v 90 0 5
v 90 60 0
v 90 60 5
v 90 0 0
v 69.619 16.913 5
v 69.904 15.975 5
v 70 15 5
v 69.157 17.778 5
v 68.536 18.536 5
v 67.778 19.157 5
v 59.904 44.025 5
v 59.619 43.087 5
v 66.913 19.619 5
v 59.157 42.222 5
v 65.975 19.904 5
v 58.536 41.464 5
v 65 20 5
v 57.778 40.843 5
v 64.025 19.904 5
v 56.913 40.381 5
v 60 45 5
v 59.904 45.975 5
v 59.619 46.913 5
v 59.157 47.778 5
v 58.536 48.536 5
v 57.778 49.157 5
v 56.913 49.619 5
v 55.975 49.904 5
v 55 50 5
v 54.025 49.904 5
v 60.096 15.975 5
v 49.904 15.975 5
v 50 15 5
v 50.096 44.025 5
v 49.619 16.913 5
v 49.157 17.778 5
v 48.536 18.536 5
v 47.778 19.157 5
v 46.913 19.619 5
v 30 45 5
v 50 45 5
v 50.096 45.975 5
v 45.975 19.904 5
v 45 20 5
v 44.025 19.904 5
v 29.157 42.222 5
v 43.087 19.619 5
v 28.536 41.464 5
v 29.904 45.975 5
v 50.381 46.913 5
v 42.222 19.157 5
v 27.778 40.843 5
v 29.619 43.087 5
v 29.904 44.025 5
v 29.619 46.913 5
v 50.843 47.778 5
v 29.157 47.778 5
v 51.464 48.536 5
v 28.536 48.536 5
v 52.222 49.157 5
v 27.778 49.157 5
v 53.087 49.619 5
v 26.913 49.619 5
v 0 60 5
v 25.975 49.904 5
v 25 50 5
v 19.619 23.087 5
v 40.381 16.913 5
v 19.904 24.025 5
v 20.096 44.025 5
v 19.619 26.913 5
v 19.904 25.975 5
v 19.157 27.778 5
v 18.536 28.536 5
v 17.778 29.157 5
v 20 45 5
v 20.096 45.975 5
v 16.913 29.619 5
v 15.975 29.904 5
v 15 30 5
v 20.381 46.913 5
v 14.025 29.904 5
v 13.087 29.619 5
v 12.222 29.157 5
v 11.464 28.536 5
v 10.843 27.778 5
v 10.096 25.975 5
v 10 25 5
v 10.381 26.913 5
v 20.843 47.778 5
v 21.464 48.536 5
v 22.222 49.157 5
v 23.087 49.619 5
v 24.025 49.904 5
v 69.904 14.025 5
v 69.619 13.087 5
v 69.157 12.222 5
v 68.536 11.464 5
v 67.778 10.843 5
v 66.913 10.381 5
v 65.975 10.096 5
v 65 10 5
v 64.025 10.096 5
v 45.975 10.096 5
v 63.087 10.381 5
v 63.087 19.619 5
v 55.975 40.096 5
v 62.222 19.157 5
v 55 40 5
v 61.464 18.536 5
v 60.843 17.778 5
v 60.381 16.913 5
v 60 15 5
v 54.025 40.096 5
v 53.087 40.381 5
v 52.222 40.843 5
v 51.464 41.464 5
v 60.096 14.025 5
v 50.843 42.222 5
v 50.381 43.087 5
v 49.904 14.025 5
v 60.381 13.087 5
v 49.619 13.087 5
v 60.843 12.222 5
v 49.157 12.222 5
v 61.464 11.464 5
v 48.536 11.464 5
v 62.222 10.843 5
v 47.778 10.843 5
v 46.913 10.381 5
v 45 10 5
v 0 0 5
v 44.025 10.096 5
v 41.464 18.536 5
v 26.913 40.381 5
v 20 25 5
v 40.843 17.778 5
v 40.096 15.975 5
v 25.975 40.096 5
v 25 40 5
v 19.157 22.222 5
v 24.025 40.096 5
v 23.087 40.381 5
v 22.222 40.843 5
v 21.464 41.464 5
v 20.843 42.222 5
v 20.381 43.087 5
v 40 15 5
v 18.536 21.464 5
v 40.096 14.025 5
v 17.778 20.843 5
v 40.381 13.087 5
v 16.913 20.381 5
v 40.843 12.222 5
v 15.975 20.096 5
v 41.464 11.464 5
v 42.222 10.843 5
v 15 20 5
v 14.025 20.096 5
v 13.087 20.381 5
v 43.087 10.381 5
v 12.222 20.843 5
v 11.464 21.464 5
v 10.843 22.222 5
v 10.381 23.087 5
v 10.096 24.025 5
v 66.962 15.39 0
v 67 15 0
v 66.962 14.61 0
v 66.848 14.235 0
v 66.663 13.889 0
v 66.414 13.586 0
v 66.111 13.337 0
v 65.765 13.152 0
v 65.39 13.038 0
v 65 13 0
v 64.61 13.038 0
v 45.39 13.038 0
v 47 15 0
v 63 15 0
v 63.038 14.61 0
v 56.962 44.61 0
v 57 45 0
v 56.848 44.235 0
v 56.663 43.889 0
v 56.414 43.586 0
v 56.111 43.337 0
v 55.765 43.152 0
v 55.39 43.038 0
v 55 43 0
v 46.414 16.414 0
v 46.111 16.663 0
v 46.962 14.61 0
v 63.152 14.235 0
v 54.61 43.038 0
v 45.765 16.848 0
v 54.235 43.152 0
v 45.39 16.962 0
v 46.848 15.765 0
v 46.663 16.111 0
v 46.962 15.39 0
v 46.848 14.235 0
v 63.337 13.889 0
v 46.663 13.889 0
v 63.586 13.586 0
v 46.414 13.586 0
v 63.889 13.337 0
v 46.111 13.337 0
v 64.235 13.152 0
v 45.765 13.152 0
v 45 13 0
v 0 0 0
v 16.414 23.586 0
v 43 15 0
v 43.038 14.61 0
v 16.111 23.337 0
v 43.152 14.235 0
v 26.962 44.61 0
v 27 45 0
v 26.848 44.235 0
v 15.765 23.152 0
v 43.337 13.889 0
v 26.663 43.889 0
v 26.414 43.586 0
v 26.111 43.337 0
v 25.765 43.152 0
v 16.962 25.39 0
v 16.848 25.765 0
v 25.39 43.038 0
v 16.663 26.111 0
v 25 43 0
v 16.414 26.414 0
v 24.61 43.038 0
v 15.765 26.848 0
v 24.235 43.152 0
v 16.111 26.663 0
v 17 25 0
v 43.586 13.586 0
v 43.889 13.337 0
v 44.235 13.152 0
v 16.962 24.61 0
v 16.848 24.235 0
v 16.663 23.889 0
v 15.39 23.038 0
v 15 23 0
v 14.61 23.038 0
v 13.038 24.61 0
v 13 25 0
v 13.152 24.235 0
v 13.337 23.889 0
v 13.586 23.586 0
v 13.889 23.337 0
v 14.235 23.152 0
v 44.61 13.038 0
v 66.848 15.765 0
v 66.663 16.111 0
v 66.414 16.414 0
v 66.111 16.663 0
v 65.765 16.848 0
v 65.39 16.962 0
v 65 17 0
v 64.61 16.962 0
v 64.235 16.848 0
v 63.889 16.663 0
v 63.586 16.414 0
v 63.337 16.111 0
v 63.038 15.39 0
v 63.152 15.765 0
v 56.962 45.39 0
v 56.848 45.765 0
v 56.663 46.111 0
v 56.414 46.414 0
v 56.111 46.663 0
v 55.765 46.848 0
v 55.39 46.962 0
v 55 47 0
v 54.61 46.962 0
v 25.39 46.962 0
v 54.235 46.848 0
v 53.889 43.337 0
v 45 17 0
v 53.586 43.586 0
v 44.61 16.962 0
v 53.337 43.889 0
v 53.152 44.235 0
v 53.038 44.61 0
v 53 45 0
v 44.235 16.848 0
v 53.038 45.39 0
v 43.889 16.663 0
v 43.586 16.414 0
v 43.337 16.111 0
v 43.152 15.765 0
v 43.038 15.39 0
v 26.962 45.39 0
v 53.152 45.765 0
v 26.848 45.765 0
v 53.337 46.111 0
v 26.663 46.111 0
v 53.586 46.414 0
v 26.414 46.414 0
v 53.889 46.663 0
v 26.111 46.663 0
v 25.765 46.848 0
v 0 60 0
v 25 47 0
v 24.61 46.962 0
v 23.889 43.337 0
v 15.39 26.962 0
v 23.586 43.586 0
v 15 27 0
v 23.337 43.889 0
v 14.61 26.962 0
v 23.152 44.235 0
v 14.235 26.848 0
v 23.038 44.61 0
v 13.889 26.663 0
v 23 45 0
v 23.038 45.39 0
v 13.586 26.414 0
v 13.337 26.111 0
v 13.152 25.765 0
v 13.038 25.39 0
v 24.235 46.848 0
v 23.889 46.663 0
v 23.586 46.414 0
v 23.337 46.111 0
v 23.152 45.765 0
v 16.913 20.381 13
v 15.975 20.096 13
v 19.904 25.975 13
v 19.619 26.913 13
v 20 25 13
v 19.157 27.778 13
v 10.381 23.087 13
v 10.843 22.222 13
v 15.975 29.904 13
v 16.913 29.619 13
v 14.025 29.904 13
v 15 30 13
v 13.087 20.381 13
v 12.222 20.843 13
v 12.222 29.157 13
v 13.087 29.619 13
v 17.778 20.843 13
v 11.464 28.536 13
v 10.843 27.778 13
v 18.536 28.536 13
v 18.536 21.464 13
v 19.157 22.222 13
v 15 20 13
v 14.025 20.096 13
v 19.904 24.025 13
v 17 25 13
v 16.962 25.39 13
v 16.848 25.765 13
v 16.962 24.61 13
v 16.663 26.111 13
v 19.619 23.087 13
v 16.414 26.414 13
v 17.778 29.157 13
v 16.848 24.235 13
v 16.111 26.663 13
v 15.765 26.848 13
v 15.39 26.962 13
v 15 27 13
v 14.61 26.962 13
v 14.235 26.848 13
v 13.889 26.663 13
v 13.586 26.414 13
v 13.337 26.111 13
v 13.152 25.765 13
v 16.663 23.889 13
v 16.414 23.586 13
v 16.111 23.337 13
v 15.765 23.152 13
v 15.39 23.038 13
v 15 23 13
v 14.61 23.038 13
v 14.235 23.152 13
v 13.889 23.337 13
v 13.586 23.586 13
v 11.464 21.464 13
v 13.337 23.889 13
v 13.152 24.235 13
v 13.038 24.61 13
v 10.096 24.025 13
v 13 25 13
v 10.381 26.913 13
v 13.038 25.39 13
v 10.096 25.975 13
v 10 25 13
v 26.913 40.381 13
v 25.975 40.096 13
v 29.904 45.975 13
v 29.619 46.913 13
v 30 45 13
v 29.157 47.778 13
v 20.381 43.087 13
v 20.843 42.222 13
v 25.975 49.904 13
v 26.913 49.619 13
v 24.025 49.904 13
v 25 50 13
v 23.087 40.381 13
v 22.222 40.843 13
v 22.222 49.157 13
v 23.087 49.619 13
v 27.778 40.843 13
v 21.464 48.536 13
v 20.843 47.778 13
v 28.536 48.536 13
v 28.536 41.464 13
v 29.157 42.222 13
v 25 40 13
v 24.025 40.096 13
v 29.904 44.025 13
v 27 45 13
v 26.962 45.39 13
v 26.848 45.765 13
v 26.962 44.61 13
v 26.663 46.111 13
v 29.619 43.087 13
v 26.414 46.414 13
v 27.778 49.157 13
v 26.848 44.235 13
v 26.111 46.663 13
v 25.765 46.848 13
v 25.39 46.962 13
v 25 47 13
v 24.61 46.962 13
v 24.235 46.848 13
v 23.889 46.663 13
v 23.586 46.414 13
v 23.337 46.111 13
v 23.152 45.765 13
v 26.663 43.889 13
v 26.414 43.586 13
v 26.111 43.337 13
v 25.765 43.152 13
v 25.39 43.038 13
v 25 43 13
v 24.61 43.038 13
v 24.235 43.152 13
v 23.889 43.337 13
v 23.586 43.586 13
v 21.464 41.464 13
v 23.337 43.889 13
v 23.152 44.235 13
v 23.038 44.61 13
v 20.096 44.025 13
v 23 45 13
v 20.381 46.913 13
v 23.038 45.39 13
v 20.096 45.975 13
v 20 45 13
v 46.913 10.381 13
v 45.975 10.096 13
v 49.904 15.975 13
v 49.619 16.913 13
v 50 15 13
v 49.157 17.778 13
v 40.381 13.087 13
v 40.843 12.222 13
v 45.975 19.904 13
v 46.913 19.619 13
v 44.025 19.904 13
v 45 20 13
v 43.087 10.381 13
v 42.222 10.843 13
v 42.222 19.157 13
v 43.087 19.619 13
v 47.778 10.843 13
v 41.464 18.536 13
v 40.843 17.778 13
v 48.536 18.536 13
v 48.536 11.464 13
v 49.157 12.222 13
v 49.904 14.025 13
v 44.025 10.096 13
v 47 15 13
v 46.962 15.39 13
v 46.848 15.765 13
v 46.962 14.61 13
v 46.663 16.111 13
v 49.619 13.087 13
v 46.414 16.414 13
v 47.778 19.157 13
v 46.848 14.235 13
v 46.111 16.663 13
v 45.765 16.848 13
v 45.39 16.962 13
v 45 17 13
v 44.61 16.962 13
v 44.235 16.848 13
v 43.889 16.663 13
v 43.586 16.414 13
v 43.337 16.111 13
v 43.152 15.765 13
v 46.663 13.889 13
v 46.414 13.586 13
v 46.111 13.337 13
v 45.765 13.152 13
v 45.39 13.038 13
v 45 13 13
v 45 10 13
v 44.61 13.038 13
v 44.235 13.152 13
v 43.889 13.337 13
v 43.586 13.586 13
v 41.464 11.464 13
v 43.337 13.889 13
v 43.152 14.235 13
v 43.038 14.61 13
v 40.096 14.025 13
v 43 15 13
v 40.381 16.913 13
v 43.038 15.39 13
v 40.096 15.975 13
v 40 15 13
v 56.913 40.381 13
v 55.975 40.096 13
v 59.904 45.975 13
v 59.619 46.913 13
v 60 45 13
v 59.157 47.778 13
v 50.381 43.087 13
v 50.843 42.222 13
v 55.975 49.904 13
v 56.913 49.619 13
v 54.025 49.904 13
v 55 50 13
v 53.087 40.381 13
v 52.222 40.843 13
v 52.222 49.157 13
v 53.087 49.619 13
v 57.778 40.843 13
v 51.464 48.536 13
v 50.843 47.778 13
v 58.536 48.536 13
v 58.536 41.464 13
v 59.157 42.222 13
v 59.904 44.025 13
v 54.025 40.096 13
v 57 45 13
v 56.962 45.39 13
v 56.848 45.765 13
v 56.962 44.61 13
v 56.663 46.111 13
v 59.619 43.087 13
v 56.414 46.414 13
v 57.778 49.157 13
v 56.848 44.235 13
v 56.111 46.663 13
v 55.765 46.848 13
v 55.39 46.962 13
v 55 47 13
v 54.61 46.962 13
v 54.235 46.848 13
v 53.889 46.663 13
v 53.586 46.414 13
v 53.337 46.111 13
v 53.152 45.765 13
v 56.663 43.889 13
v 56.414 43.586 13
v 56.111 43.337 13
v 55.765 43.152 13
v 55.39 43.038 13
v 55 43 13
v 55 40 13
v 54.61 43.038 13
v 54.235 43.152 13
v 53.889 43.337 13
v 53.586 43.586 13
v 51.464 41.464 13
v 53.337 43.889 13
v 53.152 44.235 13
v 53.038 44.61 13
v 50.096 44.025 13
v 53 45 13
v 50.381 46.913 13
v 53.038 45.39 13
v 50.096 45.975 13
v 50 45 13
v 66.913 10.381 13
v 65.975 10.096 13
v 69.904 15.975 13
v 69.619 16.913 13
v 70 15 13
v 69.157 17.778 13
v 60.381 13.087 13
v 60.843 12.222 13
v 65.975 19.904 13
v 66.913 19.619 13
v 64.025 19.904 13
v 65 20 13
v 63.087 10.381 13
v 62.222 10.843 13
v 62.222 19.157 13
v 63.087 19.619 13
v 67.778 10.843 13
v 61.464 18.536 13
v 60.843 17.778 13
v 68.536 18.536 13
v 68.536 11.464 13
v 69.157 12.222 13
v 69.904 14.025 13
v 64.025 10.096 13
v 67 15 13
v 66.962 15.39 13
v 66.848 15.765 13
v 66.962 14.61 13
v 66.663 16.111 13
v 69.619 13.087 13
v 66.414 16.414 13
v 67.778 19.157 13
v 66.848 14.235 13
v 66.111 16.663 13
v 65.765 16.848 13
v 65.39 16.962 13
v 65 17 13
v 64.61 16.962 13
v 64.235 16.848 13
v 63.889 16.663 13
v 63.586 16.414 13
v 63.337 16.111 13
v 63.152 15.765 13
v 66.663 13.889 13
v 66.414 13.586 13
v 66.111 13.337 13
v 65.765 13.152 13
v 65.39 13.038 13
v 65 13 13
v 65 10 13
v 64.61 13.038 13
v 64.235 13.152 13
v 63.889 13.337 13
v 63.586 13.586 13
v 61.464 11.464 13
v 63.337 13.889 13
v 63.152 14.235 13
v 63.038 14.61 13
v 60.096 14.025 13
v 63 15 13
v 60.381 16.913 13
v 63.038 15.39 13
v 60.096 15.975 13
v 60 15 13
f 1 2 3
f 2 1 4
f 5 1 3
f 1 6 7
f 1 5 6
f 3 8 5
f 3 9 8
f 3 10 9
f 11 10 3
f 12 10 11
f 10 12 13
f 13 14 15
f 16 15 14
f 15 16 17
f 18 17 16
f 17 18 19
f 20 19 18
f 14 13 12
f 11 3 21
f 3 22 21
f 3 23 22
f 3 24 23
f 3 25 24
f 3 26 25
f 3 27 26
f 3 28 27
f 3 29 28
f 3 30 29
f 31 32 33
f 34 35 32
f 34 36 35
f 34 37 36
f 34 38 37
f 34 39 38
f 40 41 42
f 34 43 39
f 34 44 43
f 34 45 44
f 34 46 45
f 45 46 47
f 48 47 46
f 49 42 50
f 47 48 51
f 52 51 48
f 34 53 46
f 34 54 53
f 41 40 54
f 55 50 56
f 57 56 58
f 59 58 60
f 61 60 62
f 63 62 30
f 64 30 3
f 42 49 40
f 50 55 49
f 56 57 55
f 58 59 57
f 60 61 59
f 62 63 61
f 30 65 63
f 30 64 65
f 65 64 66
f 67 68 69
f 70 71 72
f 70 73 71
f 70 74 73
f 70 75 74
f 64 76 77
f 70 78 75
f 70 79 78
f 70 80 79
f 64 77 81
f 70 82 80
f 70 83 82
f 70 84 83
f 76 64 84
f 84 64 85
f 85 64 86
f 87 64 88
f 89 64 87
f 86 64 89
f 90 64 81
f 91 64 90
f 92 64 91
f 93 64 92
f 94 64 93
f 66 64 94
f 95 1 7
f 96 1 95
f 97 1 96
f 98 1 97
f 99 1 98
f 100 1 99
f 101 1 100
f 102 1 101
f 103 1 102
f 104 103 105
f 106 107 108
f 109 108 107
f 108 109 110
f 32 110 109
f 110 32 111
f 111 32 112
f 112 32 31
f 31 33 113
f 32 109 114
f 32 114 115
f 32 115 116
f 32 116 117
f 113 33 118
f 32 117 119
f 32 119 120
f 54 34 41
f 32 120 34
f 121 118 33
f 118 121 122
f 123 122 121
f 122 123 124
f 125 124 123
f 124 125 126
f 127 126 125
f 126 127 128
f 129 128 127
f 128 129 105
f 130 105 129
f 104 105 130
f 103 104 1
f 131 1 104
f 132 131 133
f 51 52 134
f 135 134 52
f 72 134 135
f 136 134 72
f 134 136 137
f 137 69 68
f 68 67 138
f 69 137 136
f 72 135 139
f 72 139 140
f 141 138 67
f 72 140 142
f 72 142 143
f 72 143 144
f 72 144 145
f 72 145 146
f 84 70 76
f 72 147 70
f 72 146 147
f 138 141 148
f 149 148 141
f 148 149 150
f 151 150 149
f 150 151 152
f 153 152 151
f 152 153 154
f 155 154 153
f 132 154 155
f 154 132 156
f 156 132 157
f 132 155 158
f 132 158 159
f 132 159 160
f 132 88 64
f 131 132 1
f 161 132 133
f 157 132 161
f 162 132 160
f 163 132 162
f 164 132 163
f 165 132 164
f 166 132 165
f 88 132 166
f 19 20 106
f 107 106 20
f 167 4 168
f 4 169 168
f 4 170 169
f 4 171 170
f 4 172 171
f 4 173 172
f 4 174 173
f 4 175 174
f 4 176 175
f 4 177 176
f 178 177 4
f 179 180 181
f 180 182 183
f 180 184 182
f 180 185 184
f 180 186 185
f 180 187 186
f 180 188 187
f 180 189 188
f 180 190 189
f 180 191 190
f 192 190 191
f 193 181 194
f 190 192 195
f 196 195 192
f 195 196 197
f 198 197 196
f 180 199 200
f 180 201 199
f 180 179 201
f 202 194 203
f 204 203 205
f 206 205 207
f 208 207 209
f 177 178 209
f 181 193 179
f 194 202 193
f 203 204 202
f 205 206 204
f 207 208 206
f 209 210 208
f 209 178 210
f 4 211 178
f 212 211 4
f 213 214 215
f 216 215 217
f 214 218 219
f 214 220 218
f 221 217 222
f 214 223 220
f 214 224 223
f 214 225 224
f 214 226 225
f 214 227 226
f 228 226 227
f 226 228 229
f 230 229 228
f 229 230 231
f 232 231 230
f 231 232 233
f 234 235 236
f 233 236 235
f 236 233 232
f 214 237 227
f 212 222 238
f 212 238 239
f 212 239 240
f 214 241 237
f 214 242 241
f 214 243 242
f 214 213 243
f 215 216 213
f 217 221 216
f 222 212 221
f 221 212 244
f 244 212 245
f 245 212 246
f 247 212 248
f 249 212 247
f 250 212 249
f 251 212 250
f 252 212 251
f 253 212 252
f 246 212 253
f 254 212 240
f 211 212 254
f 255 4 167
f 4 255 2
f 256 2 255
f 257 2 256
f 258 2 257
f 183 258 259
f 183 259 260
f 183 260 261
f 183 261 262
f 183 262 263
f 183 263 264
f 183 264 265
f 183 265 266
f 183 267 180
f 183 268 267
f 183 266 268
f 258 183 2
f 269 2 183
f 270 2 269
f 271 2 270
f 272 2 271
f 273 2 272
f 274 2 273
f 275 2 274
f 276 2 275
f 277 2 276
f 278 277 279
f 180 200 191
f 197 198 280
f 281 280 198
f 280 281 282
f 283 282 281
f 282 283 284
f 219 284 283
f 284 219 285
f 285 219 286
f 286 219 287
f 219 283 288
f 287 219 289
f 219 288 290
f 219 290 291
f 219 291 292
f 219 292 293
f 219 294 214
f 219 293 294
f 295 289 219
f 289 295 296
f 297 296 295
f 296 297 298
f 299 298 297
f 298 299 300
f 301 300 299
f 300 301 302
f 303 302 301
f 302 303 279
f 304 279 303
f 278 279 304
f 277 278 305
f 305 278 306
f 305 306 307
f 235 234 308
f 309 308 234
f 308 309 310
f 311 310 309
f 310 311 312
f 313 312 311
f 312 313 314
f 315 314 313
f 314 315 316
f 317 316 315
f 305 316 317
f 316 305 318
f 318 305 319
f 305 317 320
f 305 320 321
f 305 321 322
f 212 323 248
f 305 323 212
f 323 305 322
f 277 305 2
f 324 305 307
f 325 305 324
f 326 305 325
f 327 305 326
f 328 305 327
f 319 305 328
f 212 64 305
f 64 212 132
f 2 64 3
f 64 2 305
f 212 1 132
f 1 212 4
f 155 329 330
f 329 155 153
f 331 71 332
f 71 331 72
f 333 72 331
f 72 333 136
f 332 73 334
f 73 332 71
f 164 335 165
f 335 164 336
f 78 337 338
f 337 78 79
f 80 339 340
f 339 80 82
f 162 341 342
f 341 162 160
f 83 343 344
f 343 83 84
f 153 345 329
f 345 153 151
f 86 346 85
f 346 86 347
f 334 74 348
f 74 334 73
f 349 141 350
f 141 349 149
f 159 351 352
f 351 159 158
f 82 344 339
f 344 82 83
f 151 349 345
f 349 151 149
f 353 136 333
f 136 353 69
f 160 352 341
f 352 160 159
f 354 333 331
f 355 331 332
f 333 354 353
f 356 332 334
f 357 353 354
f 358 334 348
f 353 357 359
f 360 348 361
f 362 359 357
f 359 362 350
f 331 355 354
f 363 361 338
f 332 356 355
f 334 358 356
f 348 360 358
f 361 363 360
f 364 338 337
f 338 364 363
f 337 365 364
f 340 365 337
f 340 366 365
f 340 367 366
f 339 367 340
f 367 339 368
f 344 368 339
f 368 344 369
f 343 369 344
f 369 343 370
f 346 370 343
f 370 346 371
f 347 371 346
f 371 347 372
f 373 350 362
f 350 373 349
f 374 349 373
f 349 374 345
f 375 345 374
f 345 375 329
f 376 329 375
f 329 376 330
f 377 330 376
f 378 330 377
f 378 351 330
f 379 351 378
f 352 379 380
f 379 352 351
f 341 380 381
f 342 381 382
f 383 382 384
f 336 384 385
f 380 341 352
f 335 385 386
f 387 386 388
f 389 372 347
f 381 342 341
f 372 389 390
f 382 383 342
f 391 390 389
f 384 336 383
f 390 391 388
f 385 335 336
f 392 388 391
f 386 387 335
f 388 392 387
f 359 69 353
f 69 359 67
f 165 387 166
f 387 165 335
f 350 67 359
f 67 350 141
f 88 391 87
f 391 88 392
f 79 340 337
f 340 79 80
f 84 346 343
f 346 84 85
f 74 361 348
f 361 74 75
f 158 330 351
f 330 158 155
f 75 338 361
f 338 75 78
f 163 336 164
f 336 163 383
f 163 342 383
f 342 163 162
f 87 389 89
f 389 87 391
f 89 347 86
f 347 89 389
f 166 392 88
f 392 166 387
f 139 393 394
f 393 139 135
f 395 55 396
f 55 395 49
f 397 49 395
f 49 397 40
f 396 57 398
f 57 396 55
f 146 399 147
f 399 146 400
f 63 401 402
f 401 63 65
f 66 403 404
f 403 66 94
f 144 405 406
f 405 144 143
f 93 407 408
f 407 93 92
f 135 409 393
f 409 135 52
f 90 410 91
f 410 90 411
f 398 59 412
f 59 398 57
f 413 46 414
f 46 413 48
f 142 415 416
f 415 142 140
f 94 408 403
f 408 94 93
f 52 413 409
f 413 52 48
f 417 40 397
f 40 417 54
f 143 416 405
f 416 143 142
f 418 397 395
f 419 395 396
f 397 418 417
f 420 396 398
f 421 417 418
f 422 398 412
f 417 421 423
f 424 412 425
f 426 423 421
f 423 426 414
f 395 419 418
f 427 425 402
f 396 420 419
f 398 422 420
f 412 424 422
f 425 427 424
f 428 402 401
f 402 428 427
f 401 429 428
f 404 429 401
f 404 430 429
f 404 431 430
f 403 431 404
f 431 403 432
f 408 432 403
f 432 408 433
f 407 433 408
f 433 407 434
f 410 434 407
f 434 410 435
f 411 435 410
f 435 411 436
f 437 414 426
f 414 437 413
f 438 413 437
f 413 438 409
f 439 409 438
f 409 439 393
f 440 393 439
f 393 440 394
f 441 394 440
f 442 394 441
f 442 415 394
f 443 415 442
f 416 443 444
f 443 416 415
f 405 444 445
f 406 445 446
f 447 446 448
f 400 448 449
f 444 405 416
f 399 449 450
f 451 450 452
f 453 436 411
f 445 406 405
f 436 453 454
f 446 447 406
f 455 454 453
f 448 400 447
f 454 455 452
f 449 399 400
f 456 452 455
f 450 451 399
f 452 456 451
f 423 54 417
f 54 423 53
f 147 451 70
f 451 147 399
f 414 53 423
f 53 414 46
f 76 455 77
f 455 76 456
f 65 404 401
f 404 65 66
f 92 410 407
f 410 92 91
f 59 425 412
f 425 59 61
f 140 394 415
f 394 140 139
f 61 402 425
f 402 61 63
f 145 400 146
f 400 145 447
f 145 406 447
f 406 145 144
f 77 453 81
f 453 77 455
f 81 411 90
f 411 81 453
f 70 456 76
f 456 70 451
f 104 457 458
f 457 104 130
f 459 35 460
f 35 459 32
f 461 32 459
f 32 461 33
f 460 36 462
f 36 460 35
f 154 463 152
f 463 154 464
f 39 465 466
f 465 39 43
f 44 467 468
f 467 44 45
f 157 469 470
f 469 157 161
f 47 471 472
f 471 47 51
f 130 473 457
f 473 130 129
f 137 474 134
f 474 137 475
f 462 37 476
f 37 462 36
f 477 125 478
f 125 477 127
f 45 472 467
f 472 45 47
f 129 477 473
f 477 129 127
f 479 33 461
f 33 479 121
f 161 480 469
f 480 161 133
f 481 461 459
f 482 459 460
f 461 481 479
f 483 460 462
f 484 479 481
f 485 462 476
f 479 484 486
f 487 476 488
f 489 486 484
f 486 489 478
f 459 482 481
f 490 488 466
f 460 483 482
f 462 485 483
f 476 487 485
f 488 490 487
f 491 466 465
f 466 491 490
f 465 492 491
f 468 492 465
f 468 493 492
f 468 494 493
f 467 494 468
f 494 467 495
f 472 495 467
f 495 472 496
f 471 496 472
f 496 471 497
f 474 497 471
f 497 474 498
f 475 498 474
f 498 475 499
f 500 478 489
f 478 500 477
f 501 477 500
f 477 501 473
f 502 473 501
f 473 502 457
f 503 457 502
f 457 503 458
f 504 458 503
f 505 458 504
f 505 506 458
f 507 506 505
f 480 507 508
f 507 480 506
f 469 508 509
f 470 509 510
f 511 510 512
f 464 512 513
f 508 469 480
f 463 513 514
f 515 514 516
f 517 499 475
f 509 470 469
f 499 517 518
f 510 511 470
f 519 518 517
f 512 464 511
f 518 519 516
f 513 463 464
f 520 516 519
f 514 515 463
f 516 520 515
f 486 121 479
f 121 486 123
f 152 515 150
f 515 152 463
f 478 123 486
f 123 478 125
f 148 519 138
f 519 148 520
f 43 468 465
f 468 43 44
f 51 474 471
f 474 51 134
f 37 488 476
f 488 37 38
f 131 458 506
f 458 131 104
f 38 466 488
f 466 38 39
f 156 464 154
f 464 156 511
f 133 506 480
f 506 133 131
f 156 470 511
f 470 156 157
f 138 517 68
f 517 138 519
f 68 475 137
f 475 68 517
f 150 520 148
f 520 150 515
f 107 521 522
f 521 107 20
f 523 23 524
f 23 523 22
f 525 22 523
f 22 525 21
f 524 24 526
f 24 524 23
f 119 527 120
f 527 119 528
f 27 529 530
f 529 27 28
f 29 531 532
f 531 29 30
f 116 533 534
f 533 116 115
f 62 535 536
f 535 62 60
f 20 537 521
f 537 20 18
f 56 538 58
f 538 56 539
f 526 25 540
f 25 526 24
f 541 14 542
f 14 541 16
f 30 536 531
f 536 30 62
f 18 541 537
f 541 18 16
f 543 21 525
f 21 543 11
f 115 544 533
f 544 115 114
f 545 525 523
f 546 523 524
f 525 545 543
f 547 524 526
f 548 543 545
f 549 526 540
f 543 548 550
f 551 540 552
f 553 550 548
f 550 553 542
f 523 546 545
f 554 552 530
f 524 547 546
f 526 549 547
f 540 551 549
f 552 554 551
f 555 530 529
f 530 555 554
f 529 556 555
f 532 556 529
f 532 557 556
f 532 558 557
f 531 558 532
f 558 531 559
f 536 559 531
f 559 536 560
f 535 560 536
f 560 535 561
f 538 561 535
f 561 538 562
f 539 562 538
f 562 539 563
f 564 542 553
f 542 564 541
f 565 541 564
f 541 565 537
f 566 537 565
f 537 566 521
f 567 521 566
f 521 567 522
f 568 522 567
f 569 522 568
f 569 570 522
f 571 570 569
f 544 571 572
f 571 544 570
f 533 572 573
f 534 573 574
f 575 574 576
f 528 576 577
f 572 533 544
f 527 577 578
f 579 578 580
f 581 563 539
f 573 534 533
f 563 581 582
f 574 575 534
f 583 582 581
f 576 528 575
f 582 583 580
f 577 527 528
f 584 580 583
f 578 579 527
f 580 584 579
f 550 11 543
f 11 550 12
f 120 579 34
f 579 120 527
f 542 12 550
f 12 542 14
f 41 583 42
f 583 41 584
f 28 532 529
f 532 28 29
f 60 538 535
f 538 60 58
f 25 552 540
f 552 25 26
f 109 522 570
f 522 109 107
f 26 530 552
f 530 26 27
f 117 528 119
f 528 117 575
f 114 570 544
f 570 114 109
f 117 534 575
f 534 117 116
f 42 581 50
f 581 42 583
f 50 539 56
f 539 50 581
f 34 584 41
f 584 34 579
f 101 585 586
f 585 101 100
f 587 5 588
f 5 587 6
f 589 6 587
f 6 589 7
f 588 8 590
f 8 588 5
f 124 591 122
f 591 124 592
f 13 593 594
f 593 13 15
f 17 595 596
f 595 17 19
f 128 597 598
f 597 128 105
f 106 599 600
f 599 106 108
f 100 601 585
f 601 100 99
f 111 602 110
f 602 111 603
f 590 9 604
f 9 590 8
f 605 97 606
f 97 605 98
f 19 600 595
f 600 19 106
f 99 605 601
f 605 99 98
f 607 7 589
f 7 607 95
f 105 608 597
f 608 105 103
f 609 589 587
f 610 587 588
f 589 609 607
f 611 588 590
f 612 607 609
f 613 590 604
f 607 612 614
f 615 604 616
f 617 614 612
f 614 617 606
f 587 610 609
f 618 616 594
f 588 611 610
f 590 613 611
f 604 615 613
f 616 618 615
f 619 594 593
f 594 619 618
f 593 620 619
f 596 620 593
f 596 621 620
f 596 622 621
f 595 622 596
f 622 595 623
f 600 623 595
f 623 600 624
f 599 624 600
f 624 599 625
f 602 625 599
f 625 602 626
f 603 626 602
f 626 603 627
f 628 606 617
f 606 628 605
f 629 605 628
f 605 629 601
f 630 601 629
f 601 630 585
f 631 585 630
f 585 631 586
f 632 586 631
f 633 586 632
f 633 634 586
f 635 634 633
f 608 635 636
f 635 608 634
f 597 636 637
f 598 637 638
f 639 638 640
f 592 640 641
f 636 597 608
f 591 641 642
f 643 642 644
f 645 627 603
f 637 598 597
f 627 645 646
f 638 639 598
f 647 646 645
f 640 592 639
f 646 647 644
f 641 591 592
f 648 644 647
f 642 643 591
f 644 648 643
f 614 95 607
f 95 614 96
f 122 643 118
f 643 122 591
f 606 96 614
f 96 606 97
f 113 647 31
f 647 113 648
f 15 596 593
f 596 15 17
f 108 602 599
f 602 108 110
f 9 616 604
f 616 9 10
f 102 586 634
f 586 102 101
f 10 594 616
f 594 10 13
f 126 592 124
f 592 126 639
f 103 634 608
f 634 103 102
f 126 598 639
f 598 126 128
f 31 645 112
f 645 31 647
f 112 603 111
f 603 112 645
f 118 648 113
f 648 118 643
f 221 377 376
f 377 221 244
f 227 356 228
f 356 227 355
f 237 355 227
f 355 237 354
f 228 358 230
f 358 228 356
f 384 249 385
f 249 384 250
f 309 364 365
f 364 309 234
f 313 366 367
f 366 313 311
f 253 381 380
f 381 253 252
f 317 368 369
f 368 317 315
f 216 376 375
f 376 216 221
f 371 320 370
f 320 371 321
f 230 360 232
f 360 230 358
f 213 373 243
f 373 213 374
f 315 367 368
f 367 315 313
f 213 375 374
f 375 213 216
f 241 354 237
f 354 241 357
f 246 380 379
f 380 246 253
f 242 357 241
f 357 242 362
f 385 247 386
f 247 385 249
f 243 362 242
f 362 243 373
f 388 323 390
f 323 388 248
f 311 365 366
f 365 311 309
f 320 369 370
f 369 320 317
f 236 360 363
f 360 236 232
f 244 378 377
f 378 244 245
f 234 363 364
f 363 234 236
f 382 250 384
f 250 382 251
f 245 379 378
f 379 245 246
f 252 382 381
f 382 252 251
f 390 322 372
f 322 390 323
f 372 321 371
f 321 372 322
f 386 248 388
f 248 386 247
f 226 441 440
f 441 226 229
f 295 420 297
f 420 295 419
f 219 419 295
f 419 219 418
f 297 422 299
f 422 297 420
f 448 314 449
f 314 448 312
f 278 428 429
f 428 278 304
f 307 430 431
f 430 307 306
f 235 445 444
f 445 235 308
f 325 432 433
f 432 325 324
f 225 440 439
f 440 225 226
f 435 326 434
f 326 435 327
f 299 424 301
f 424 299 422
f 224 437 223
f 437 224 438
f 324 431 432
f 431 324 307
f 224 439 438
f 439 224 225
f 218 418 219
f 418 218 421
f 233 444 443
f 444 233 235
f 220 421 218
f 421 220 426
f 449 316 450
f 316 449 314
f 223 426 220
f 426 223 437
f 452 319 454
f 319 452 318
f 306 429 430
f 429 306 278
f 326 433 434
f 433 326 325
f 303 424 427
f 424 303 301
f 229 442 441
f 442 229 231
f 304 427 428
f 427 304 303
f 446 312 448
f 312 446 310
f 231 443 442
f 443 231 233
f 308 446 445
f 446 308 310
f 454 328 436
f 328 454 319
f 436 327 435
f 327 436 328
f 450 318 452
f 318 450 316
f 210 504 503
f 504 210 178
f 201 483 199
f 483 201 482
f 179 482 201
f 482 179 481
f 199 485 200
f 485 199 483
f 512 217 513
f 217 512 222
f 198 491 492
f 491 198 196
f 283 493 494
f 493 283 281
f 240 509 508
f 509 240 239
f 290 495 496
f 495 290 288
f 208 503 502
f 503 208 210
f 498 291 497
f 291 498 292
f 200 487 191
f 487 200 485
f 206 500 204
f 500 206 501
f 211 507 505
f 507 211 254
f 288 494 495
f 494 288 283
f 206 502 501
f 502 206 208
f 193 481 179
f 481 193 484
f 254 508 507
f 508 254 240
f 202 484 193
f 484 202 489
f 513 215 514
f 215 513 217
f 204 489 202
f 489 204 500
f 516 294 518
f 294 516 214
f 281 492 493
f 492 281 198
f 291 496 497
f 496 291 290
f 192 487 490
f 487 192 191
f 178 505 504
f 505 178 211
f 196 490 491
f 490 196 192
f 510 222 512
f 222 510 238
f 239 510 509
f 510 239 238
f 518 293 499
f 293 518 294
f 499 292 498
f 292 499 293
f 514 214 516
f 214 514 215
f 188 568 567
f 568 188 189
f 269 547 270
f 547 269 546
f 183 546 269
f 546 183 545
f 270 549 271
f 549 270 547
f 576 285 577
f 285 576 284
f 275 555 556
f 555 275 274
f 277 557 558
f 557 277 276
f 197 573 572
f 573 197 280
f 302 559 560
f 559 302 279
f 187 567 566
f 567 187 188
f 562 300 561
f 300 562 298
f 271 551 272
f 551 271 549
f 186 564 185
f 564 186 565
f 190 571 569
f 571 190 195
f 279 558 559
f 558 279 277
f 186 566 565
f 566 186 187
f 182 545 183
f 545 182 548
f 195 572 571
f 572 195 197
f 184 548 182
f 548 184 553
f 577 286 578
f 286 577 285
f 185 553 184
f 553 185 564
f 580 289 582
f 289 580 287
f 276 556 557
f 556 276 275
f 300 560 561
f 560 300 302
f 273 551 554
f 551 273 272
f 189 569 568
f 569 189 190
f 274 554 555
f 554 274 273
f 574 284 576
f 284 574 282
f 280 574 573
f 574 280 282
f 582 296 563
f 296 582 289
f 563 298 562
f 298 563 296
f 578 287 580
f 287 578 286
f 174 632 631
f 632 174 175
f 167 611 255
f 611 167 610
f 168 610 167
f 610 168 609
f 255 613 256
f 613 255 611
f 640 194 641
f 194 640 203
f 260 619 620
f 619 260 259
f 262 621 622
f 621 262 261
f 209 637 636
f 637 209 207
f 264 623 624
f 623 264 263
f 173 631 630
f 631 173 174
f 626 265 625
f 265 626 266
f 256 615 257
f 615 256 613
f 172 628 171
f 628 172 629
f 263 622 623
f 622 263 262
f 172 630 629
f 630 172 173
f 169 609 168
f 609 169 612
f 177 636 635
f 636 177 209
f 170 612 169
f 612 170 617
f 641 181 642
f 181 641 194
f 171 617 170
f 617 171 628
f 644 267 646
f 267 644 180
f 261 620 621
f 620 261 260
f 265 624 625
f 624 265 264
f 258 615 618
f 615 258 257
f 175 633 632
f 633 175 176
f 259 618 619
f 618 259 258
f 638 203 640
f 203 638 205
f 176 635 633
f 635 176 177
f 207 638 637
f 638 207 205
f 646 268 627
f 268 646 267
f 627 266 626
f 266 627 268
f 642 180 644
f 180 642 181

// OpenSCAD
$fn = 32;

// ----------------------------------------------------------------------
// Boss field: plate with bosses at given coordinates
// ----------------------------------------------------------------------

// --- parameters (mm) ---
plate_l = 90;             // plate length, X
plate_w = 60;             // plate width, Y
plate_t = 5;              // plate thickness, Z
boss_d = 10;              // boss diameter
boss_h = 8;               // boss height above the plate
bore_d = 4;               // boss bore

total_h = plate_t + boss_h;  // overall height

difference() {
  union() {
    cube([plate_l, plate_w, plate_t]);
    translate([15, 25, plate_t]) cylinder(h = boss_h, d = boss_d);
    translate([25, 45, plate_t]) cylinder(h = boss_h, d = boss_d);
    translate([45, 15, plate_t]) cylinder(h = boss_h, d = boss_d);
    translate([55, 45, plate_t]) cylinder(h = boss_h, d = boss_d);
    translate([65, 15, plate_t]) cylinder(h = boss_h, d = boss_d);
  }
  translate([15, 25, -1]) cylinder(h = total_h + 2, d = bore_d);
  translate([25, 45, -1]) cylinder(h = total_h + 2, d = bore_d);
  translate([45, 15, -1]) cylinder(h = total_h + 2, d = bore_d);
  translate([55, 45, -1]) cylinder(h = total_h + 2, d = bore_d);
  translate([65, 15, -1]) cylinder(h = total_h + 2, d = bore_d);
}
